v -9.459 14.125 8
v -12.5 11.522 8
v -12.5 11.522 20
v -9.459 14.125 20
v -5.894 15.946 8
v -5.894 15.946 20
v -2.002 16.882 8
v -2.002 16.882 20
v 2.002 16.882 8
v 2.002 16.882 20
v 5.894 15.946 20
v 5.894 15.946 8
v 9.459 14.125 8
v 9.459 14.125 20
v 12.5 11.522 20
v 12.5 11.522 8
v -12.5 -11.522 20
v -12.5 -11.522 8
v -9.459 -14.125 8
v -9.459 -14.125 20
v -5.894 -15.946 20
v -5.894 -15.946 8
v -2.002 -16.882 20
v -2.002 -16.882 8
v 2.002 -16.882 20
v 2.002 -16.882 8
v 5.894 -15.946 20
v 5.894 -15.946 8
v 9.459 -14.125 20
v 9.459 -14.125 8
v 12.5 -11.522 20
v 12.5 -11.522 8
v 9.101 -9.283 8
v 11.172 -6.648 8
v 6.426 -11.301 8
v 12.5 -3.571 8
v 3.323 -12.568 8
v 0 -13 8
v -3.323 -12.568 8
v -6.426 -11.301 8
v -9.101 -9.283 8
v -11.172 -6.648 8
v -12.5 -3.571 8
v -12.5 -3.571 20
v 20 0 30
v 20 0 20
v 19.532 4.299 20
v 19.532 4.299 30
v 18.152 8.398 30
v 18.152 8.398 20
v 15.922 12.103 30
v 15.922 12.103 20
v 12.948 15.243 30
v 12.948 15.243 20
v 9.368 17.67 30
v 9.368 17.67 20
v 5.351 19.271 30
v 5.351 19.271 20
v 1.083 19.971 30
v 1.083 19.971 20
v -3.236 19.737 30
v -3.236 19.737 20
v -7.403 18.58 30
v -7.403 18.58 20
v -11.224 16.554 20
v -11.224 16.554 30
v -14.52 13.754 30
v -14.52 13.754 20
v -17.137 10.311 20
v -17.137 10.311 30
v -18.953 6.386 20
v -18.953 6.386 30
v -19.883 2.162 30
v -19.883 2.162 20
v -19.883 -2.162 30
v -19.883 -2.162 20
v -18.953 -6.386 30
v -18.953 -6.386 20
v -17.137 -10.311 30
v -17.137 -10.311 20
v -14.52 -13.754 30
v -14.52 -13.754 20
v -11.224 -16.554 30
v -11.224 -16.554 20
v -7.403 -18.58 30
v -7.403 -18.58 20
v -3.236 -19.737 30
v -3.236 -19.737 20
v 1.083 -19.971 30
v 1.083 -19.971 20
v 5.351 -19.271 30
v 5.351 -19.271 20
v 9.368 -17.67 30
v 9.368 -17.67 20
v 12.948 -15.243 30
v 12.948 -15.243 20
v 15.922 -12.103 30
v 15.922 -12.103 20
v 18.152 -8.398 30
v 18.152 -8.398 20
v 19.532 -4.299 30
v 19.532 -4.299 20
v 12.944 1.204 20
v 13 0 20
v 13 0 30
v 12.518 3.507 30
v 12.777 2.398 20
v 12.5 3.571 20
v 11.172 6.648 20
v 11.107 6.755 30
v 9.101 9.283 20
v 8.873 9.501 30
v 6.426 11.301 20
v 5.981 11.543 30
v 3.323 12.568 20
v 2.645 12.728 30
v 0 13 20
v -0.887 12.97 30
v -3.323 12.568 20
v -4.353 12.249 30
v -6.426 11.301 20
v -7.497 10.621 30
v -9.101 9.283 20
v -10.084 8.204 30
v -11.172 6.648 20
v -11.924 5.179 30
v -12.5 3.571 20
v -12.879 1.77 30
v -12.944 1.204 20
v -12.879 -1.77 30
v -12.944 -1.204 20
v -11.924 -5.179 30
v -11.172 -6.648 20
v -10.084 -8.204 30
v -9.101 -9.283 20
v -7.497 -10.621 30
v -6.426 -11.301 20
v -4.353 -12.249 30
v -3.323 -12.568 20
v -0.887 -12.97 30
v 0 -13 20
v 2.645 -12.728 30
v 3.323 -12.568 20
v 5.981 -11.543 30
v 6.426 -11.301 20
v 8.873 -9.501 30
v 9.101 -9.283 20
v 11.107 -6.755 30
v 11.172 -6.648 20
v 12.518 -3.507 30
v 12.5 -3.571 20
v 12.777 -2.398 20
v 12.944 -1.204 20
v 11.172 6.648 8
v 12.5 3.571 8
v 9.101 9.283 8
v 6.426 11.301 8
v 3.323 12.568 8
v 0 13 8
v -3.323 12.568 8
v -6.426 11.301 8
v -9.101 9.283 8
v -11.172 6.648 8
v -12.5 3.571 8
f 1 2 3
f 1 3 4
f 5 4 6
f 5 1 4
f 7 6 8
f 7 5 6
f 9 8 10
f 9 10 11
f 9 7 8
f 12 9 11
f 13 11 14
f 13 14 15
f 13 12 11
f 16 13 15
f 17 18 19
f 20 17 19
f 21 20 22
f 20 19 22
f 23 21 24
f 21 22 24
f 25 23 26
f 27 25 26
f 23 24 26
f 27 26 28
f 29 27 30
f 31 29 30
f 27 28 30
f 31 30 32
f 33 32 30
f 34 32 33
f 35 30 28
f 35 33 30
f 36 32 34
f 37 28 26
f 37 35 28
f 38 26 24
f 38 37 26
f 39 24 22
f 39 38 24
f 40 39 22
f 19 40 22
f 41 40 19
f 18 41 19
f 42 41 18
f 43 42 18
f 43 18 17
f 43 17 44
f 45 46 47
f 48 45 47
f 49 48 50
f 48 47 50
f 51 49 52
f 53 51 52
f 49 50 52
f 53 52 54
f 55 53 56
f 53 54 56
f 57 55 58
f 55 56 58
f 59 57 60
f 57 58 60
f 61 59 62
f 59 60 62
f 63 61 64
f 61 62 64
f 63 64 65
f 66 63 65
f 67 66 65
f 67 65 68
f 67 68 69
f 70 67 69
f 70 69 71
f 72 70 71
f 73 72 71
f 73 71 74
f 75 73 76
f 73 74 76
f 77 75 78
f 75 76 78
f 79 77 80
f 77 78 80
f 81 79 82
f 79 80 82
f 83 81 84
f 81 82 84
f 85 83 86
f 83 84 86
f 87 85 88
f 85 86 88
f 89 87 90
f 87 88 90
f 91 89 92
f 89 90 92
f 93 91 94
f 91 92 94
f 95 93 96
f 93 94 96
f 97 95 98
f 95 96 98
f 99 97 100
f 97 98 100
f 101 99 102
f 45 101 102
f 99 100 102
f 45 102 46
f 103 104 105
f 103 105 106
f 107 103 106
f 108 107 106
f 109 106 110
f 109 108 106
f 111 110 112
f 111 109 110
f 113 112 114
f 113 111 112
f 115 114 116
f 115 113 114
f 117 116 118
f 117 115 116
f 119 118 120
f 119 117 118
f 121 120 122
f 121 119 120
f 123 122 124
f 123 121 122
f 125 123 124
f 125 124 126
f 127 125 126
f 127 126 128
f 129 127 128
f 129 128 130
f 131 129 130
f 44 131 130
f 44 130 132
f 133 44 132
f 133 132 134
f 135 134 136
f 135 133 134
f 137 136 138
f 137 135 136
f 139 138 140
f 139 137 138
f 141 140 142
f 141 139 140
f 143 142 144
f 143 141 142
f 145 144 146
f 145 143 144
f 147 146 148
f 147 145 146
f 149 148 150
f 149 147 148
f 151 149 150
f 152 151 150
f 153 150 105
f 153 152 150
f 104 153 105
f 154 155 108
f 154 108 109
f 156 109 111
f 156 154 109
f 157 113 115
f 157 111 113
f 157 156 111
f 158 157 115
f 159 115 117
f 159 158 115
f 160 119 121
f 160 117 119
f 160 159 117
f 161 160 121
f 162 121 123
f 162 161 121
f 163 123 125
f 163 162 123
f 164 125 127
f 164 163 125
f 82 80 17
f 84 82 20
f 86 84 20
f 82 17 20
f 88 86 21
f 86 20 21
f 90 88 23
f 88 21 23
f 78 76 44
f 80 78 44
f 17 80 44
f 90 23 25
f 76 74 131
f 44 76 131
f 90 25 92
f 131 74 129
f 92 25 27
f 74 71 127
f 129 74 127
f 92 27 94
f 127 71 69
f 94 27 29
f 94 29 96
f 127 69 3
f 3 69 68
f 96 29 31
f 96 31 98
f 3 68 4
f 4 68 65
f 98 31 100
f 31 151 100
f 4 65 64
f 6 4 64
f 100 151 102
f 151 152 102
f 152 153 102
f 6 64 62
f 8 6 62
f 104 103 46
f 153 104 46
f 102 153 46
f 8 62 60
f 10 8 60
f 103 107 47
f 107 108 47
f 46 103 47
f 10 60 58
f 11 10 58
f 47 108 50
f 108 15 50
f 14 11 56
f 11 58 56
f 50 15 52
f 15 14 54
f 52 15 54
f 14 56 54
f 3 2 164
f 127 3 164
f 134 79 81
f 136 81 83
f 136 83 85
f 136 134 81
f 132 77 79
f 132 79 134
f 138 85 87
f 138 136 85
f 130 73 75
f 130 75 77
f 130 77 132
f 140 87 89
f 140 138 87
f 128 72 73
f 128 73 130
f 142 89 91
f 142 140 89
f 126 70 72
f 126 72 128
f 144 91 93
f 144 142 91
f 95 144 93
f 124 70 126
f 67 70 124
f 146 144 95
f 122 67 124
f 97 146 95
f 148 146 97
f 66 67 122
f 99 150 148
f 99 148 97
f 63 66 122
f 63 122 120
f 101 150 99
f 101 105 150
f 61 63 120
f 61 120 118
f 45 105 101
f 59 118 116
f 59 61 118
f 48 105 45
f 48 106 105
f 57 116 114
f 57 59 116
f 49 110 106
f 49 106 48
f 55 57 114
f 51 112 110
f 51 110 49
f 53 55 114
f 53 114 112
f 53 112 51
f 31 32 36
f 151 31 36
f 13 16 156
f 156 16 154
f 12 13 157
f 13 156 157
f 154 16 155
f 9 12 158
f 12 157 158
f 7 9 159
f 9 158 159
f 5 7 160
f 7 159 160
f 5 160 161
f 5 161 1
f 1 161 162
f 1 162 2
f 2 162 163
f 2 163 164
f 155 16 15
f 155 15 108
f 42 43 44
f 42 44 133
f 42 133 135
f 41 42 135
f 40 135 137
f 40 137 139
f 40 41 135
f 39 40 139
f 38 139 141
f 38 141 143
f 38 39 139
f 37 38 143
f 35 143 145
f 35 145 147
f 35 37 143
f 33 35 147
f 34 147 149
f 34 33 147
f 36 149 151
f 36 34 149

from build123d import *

# Parameters (mm, degrees)
PAD026_DEPTH  = 12
SKETCH071_R   = 20
SKETCH071_R_2 = 13
PAD027_DEPTH  = 10


with BuildPart() as part:
    # Sketch070 (on Face5 of Binder016) → Pad026 (new body)
    with BuildSketch(Plane.XY.offset(8)):
        with BuildLine():
            ThreePointArc((-12.5, -3.570714), (0, -13), (12.5, -3.570714))
            Line((12.5, -11.521719), (12.5, -3.570714))
            ThreePointArc((-12.5, -11.521719), (0, -17), (12.5, -11.521719))
            Line((-12.5, -11.521719), (-12.5, -3.570714))
        make_face()
    pad026 = extrude(amount=PAD026_DEPTH)

    # Mirrored: Pad026 across XZ
    add(pad026.mirror(Plane.XZ))

    # Sketch071 (on Face4 of Mirrored) → Pad027 (join)
    with BuildSketch(Plane.XY.offset(20)):
        Circle(SKETCH071_R)
        Circle(SKETCH071_R_2, mode=Mode.SUBTRACT)
    extrude(amount=PAD027_DEPTH)

    # Mirrored001: Pad026 across XZ
    add(pad026.mirror(Plane.XZ))


solid = part.part
